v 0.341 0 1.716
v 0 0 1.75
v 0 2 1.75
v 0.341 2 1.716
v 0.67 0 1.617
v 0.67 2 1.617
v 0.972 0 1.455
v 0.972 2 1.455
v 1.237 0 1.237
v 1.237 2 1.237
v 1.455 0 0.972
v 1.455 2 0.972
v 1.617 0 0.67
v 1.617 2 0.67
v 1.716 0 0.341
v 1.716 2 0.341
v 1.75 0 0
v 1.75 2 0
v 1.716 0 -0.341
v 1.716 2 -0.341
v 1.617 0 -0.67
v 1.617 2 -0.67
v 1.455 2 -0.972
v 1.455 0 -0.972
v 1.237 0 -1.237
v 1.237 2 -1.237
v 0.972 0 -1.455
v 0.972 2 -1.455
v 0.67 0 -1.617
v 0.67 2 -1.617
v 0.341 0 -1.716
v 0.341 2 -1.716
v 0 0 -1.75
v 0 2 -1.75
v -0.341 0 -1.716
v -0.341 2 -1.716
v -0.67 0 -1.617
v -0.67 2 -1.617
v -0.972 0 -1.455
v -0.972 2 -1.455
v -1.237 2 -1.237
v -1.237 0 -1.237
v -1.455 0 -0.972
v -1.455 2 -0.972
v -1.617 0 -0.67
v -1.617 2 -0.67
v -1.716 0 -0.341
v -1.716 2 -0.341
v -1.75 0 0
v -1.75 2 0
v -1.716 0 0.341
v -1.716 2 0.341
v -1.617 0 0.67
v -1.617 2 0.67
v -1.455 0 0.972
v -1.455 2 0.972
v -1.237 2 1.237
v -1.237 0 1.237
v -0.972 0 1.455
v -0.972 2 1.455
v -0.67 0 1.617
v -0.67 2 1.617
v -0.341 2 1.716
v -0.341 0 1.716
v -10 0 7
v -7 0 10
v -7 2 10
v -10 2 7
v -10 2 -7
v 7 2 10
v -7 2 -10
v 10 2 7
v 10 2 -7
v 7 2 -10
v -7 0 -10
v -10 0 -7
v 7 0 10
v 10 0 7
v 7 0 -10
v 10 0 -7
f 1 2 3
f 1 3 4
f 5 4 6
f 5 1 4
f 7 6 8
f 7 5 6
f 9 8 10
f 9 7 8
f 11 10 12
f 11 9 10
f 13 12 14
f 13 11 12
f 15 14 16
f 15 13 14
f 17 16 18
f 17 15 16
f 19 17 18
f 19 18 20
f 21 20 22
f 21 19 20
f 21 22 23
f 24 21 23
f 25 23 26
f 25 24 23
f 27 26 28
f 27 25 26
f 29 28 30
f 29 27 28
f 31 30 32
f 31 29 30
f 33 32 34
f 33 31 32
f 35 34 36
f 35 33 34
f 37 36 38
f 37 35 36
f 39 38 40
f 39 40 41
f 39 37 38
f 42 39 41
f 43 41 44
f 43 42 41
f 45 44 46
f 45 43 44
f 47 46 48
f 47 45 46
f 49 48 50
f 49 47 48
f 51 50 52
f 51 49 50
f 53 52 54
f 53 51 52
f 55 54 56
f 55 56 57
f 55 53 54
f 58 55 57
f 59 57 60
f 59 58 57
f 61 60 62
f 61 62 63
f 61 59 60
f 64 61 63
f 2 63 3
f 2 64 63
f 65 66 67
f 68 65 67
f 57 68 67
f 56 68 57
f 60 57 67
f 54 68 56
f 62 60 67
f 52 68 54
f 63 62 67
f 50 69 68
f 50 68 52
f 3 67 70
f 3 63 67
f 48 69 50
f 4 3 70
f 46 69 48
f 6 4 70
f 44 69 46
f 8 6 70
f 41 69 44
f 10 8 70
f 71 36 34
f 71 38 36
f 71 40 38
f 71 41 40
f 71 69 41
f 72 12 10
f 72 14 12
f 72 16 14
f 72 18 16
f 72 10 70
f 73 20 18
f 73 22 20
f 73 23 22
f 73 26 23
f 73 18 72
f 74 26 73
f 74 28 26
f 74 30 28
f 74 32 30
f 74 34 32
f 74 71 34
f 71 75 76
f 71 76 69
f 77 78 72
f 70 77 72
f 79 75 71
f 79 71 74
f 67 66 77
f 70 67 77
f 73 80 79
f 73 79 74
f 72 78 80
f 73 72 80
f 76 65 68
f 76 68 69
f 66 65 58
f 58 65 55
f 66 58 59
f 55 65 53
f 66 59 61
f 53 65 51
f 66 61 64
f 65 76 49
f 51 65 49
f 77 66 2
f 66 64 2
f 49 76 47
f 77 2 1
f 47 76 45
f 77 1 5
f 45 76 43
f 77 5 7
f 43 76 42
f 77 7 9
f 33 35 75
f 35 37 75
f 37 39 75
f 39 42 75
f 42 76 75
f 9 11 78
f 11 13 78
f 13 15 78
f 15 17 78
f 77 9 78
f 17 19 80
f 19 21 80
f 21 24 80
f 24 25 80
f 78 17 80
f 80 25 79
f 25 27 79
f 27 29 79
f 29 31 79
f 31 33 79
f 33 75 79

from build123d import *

# Parameters (mm, degrees)
SKETCH1_W           = 20
SKETCH1_H           = 20
SKETCH1_R           = 1.75
BOSS_EXTRUDE1_DEPTH = 2
CHAMFER1_SIZE       = 3


with BuildPart() as part:
    # Sketch1 → Boss-Extrude1 (new body)
    with BuildSketch(Plane(origin=(0, 0, 0), x_dir=(1, 0, 0), z_dir=(0, 1, 0))):
        Rectangle(SKETCH1_W, SKETCH1_H)
        with Locations(Location((0, 0, 0), (0, 0, 270))):
            Circle(SKETCH1_R, mode=Mode.SUBTRACT)
    extrude(amount=BOSS_EXTRUDE1_DEPTH)

    # Chamfer1
    chamfer1_edges = [part.edges().sort_by_distance(p)[0] for p in [
        (-10, 1, -10),
        (10, 1, -10),
        (10, 1, 10),
        (-10, 1, 10),
    ]]
    chamfer(chamfer1_edges, length=CHAMFER1_SIZE)


solid = part.part
